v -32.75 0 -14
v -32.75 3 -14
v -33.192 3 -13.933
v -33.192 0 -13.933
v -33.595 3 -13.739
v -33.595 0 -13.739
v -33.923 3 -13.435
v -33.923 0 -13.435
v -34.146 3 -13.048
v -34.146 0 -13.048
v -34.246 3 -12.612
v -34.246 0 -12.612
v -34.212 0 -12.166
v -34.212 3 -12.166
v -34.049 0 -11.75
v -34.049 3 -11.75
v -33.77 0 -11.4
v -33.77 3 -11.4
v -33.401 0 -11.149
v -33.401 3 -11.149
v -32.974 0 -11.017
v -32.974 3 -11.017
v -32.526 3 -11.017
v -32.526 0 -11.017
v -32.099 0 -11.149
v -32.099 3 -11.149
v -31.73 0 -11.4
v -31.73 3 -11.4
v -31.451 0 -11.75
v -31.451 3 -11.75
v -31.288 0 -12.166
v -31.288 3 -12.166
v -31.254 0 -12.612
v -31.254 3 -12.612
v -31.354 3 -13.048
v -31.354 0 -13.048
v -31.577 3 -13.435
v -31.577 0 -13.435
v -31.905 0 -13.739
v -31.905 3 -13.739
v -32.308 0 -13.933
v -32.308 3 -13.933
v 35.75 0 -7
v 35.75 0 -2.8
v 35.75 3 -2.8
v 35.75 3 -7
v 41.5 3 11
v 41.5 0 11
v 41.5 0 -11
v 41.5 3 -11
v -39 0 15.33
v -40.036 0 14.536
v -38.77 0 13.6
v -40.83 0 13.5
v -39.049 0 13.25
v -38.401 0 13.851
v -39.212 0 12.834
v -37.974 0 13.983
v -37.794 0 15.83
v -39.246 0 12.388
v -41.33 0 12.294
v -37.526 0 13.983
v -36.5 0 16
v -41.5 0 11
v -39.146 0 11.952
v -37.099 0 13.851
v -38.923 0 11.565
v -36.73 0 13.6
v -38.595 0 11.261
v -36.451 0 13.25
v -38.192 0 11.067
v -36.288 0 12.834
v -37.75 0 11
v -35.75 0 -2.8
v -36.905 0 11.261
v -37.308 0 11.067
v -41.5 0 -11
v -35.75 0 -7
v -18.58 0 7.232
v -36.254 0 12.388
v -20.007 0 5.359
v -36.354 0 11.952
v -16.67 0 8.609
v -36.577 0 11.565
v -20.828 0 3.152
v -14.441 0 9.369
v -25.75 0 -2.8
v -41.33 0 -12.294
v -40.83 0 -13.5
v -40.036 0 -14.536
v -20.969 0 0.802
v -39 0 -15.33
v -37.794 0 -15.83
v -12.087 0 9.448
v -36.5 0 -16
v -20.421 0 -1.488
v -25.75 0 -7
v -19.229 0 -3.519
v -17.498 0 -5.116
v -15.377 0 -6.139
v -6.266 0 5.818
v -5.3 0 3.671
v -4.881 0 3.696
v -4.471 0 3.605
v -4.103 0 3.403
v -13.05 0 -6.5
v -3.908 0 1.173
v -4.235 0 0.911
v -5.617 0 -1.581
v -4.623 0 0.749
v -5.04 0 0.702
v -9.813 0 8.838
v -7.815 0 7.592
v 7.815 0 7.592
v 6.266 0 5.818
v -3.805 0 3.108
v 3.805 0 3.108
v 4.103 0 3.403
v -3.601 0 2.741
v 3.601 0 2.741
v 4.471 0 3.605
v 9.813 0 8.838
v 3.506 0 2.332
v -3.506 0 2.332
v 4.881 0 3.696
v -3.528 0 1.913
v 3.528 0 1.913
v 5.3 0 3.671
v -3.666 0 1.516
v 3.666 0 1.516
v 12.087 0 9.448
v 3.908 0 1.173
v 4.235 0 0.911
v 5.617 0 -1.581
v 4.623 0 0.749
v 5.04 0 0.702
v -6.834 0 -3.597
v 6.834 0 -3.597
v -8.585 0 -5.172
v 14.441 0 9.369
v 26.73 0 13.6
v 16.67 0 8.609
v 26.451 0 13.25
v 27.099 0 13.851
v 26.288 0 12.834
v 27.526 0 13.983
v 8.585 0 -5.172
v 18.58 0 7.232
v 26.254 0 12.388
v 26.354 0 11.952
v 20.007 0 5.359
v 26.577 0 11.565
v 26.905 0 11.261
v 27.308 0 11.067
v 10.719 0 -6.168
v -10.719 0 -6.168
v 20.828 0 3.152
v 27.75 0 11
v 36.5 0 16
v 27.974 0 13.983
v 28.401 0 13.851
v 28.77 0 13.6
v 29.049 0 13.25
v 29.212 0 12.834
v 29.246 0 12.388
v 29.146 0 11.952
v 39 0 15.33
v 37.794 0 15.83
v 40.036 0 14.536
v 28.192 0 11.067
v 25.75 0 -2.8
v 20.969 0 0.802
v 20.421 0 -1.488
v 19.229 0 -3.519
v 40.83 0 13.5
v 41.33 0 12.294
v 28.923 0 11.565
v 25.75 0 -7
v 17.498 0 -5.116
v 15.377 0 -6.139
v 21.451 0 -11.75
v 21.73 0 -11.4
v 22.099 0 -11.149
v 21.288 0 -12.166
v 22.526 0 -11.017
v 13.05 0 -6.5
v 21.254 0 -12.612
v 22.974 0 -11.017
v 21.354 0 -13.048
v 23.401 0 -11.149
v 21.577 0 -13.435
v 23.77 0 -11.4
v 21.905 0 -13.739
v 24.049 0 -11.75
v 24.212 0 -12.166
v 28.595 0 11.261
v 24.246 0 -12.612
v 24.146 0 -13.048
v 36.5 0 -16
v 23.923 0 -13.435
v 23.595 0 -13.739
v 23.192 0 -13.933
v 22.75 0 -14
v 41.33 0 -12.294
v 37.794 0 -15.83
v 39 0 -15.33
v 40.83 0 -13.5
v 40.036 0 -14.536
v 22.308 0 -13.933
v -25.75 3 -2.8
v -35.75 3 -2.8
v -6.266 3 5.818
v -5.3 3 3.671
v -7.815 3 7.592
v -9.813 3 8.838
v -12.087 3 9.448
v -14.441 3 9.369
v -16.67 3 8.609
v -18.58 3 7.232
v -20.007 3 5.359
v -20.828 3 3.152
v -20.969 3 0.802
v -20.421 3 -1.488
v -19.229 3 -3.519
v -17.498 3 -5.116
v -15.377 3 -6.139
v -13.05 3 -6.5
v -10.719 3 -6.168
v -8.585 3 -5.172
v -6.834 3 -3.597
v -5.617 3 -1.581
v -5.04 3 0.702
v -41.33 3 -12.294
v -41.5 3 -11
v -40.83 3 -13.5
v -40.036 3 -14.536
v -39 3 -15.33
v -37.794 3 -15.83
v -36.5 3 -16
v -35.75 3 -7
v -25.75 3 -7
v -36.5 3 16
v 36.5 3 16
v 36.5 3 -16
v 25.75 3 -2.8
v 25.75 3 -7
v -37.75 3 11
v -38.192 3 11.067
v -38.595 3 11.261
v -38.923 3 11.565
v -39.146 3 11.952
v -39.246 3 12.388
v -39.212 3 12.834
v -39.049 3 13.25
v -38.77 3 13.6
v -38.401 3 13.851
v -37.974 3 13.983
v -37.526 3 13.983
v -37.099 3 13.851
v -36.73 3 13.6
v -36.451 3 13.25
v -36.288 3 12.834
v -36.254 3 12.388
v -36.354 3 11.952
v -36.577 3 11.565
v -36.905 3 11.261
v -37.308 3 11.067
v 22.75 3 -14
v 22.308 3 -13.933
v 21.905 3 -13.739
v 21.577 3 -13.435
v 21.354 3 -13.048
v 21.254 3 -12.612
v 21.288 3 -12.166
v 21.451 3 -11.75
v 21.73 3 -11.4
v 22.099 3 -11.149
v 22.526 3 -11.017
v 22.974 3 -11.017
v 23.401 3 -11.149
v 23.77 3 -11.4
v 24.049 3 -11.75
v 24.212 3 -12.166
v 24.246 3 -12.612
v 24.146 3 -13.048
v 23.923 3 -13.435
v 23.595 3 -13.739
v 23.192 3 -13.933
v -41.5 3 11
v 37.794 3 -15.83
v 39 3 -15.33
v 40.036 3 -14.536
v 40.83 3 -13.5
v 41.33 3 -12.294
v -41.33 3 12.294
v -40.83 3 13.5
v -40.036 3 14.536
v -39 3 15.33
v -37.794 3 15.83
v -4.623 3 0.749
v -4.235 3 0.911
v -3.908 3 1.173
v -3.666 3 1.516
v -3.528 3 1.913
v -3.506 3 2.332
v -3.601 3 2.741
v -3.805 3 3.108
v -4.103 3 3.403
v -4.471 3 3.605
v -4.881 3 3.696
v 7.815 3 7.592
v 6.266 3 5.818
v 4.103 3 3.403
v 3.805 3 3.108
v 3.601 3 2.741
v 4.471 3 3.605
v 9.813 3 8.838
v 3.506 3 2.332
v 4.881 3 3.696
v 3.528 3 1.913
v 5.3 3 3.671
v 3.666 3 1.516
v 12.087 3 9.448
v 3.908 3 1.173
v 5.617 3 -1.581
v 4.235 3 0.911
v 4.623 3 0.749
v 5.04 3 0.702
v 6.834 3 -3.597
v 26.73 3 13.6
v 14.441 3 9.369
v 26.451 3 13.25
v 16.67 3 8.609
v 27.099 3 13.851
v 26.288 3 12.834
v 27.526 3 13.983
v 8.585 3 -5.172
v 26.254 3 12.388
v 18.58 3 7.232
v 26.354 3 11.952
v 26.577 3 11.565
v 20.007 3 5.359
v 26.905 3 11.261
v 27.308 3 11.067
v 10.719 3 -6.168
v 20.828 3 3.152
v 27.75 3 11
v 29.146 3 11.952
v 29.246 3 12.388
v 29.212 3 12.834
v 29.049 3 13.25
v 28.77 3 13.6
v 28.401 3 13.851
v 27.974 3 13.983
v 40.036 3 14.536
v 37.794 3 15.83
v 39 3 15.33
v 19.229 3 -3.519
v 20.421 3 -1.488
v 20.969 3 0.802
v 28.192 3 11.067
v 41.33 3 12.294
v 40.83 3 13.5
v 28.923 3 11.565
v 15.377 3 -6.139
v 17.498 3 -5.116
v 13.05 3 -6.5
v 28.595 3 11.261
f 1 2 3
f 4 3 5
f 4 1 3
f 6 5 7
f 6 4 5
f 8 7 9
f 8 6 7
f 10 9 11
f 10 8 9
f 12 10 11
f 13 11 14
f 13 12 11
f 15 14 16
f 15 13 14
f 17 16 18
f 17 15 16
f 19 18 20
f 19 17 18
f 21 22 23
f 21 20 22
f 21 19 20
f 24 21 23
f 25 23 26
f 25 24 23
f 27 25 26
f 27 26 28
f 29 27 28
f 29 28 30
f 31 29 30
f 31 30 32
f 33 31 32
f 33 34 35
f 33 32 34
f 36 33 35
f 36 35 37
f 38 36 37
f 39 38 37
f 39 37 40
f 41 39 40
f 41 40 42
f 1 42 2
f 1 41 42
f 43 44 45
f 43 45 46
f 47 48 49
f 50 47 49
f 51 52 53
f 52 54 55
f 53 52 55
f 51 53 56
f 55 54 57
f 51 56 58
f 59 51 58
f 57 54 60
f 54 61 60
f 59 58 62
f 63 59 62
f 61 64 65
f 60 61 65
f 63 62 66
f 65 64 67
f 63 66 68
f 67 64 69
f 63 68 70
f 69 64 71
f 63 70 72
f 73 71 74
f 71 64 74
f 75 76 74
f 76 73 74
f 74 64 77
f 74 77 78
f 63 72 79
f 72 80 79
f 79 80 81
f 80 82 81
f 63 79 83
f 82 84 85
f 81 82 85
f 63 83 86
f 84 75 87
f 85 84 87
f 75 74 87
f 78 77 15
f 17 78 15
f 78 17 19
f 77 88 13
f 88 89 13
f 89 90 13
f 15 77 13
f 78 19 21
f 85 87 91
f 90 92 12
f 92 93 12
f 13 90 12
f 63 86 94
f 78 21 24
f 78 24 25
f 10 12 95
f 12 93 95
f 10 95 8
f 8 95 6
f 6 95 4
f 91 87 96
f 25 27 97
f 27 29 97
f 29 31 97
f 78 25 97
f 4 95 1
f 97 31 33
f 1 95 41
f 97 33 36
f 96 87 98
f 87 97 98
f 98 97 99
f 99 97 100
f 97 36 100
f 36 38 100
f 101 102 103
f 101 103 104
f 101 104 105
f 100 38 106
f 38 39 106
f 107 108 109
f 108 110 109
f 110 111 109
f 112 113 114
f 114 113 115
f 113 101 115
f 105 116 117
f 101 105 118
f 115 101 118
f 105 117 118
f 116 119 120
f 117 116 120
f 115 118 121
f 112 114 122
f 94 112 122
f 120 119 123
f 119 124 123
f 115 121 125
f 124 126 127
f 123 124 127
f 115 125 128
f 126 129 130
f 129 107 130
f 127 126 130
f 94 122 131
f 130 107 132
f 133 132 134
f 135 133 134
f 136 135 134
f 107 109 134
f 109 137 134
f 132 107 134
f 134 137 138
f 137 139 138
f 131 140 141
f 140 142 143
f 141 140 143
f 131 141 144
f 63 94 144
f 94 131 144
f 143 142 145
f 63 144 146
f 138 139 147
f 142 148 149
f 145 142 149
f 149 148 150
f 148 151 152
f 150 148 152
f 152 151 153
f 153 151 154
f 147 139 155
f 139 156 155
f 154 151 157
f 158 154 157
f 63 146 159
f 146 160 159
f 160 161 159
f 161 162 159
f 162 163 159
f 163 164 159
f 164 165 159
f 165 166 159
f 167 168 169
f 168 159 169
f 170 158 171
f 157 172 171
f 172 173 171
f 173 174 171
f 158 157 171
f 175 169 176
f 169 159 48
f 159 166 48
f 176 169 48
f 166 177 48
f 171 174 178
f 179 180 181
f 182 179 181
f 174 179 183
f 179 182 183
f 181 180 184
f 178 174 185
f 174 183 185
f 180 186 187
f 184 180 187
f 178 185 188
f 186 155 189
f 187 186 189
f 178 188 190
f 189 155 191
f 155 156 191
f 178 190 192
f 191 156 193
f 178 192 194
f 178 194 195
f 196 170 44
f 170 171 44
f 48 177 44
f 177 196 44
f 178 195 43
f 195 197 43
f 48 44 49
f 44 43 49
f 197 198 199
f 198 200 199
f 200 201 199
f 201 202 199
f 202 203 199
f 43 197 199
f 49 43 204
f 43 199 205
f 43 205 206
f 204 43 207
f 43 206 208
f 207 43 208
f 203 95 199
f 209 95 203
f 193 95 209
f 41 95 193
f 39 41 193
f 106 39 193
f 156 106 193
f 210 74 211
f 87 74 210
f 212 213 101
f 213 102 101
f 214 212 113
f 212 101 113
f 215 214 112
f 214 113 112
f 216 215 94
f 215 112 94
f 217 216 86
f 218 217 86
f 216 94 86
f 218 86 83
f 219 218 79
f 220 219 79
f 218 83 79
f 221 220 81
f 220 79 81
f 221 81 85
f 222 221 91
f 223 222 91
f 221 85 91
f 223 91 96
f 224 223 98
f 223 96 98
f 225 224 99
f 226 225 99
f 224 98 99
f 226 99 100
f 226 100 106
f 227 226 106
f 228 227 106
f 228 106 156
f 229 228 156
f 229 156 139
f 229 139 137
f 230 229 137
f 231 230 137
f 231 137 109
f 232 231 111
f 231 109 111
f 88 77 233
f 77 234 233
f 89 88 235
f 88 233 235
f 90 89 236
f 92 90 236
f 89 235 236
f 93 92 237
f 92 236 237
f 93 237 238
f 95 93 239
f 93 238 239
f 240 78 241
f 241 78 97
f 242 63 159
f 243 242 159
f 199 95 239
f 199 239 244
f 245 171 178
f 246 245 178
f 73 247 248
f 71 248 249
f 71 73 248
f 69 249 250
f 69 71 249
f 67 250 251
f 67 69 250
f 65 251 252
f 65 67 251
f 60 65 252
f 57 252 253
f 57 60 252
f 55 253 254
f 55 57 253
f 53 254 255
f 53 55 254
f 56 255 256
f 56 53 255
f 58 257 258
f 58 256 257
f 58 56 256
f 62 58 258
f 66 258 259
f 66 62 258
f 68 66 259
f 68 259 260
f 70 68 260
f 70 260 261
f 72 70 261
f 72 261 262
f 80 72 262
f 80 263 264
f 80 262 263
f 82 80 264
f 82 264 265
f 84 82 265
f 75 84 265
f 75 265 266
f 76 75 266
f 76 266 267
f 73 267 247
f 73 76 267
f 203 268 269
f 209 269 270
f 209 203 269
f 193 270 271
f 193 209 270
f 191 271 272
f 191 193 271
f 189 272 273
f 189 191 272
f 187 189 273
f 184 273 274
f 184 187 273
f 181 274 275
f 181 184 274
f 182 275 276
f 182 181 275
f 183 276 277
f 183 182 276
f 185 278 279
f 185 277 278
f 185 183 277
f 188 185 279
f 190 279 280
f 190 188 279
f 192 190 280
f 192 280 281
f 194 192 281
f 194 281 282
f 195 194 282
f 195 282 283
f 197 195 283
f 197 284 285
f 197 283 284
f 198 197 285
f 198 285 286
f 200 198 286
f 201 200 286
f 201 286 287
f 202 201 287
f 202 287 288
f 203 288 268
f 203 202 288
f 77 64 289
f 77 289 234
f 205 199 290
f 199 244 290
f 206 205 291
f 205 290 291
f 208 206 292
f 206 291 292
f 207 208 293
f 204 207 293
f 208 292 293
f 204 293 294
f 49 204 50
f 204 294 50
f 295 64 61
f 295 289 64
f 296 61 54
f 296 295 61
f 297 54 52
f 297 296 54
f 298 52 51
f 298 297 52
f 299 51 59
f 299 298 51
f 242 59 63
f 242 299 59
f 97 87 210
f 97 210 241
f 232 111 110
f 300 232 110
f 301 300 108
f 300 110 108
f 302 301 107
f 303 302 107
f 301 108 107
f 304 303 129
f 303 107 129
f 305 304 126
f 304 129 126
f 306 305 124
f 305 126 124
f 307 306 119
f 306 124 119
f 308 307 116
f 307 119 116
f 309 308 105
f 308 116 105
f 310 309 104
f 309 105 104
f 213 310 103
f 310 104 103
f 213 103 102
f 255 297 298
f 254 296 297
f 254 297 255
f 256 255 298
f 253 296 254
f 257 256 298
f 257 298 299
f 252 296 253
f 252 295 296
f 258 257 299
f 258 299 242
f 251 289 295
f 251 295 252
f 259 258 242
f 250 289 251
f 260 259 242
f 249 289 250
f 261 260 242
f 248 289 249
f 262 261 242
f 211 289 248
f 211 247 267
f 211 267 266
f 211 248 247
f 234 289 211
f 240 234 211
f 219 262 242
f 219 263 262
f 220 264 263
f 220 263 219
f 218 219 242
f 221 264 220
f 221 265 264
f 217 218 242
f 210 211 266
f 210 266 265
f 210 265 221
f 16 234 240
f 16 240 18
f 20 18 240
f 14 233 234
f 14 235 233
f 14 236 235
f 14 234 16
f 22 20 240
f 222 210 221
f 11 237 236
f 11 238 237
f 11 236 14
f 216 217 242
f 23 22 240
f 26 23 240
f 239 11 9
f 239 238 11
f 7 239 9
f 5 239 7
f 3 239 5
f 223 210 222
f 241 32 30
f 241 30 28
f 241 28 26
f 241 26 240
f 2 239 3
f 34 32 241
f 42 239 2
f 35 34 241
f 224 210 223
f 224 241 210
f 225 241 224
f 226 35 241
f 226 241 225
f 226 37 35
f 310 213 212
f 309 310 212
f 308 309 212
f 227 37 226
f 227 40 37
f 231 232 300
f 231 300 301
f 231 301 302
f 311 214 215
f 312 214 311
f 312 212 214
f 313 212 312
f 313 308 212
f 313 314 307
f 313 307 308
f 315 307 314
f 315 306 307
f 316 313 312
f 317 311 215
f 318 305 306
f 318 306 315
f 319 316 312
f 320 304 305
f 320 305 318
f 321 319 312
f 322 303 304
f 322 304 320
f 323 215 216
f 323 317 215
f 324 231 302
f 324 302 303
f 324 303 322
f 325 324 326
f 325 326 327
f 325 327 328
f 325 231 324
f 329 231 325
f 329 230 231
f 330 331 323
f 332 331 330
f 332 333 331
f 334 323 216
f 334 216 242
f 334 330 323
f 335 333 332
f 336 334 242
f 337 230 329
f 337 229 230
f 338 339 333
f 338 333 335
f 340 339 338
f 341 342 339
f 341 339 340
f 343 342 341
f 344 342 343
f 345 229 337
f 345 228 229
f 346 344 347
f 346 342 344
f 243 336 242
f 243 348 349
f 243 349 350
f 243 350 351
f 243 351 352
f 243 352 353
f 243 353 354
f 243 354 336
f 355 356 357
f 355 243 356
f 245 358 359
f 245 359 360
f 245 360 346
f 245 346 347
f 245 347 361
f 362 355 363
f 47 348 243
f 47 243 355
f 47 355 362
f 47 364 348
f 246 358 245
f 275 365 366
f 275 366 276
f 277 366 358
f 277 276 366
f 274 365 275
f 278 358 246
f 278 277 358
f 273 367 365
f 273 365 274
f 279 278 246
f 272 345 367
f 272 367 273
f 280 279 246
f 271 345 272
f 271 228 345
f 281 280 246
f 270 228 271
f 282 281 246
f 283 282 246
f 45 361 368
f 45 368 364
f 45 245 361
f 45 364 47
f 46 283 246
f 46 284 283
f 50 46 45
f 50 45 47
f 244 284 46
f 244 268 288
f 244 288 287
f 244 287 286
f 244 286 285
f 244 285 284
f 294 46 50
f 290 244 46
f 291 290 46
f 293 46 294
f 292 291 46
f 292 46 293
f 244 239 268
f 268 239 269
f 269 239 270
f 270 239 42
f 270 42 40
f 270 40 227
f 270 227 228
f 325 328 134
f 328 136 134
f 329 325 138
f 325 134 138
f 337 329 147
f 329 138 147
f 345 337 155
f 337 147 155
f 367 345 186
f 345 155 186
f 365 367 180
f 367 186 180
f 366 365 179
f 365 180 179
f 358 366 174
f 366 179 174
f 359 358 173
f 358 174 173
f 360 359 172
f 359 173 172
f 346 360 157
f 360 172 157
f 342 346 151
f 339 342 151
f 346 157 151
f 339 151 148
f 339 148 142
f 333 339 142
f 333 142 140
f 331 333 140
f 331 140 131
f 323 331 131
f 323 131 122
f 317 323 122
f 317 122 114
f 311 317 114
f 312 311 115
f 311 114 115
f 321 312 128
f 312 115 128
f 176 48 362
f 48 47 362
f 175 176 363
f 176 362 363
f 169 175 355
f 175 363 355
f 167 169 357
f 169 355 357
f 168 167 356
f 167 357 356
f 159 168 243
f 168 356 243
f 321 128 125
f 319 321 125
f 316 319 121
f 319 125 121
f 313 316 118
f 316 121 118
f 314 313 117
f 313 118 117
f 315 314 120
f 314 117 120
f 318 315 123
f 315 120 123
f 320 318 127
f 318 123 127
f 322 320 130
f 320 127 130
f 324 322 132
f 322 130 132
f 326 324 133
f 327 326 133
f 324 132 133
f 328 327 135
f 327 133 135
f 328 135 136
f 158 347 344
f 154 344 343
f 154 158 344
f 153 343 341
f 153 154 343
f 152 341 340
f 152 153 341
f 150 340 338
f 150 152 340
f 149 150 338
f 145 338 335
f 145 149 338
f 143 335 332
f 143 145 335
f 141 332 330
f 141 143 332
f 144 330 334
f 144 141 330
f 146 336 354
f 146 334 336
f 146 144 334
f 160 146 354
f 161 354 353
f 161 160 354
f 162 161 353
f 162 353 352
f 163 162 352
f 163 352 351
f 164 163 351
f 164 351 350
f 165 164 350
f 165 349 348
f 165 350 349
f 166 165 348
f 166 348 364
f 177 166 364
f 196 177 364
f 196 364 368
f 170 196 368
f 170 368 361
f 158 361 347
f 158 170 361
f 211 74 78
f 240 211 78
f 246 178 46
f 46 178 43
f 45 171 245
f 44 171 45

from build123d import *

# Parameters (mm, degrees)
SKETCH1_W           = 95
SKETCH1_H           = 35
BOSS_EXTRUDE1_DEPTH = 3
CUT_EXTRUDE1_REACH  = 52.71
SKETCH3_R           = 8
CUT_EXTRUDE2_REACH  = 52.71
SKETCH4_R           = 1.5
SKETCH5_W           = 95
SKETCH5_H           = 4
BOSS_EXTRUDE2_DEPTH = 3
CUT_EXTRUDE3_REACH  = 54.225
SKETCH6_W           = 10
SKETCH6_H           = 4.2
CUT_EXTRUDE4_REACH  = 54.225
SKETCH7_R           = 1.5
CUT_EXTRUDE5_REACH  = 54.225
SKETCH8_W           = 105.539235452
SKETCH8_H           = 51.644684014
SKETCH8_W_2         = 83
SKETCH8_H_2         = 32
FILLET1_R           = 5


with BuildPart() as part:
    # Sketch1 → Boss-Extrude1 (new body)
    with BuildSketch(Plane(origin=(0, 0, 0), x_dir=(1, 0, 0), z_dir=(0, 1, 0))):
        Rectangle(SKETCH1_W, SKETCH1_H)
    extrude(amount=BOSS_EXTRUDE1_DEPTH)

    # Sketch3 → Cut-Extrude1 (cut, up to next)
    with BuildSketch(Plane.XZ, mode=Mode.PRIVATE) as cut_extrude1_sk1:
        with Locations(Location((-13, 1.5, 0), (0, 0, 270))):
            Circle(SKETCH3_R)
    cut_extrude1_tool1 = extrude(cut_extrude1_sk1.sketch, amount=-CUT_EXTRUDE1_REACH, mode=Mode.PRIVATE) & part.part
    # Sketch3 → Cut-Extrude1 (cut, up to next)
    with BuildSketch(Plane.XZ, mode=Mode.PRIVATE) as cut_extrude1_sk2:
        with Locations(Location((13, 1.5, 0), (0, 0, 270))):
            Circle(SKETCH3_R)
    cut_extrude1_tool2 = extrude(cut_extrude1_sk2.sketch, amount=-CUT_EXTRUDE1_REACH, mode=Mode.PRIVATE) & part.part
    add(cut_extrude1_tool1.solids().sort_by_distance((-13, 0, 1.5))[0], mode=Mode.SUBTRACT)
    add(cut_extrude1_tool2.solids().sort_by_distance((13, 0, 1.5))[0], mode=Mode.SUBTRACT)

    # Sketch4 → Cut-Extrude2 (cut, up to next)
    with BuildSketch(Plane(origin=(0, 0, 0), x_dir=(1, 0, 0), z_dir=(0, 1, 0)), mode=Mode.PRIVATE) as cut_extrude2_sk1:
        with Locations(Location((-37.75, -12.5, 0), (0, 0, 90))):
            Circle(SKETCH4_R)
    cut_extrude2_tool1 = extrude(cut_extrude2_sk1.sketch, amount=CUT_EXTRUDE2_REACH, mode=Mode.PRIVATE) & part.part
    # Sketch4 → Cut-Extrude2 (cut, up to next)
    with BuildSketch(Plane(origin=(0, 0, 0), x_dir=(1, 0, 0), z_dir=(0, 1, 0)), mode=Mode.PRIVATE) as cut_extrude2_sk2:
        with Locations(Location((27.75, -12.5, 0), (0, 0, 90))):
            Circle(SKETCH4_R)
    cut_extrude2_tool2 = extrude(cut_extrude2_sk2.sketch, amount=CUT_EXTRUDE2_REACH, mode=Mode.PRIVATE) & part.part
    # Sketch4 → Cut-Extrude2 (cut, up to next)
    with BuildSketch(Plane(origin=(0, 0, 0), x_dir=(1, 0, 0), z_dir=(0, 1, 0)), mode=Mode.PRIVATE) as cut_extrude2_sk3:
        with Locations(Location((22.75, 12.5, 0), (0, 0, 90))):
            Circle(SKETCH4_R)
    cut_extrude2_tool3 = extrude(cut_extrude2_sk3.sketch, amount=CUT_EXTRUDE2_REACH, mode=Mode.PRIVATE) & part.part
    # Sketch4 → Cut-Extrude2 (cut, up to next)
    with BuildSketch(Plane(origin=(0, 0, 0), x_dir=(1, 0, 0), z_dir=(0, 1, 0)), mode=Mode.PRIVATE) as cut_extrude2_sk4:
        with Locations(Location((-32.75, 12.5, 0), (0, 0, 90))):
            Circle(SKETCH4_R)
    cut_extrude2_tool4 = extrude(cut_extrude2_sk4.sketch, amount=CUT_EXTRUDE2_REACH, mode=Mode.PRIVATE) & part.part
    add(cut_extrude2_tool1.solids().sort_by_distance((-37.75, 0, 12.5))[0], mode=Mode.SUBTRACT)
    add(cut_extrude2_tool2.solids().sort_by_distance((27.75, 0, 12.5))[0], mode=Mode.SUBTRACT)
    add(cut_extrude2_tool3.solids().sort_by_distance((22.75, 0, -12.5))[0], mode=Mode.SUBTRACT)
    add(cut_extrude2_tool4.solids().sort_by_distance((-32.75, 0, -12.5))[0], mode=Mode.SUBTRACT)

    # Sketch5 → Boss-Extrude2 (add)
    with BuildSketch(Plane(origin=(0, 0, 0), x_dir=(1, 0, 0), z_dir=(0, 1, 0))):
        with Locations((0, -19.5)):
            Rectangle(SKETCH5_W, SKETCH5_H)
        with Locations((0, 19.5)):
            Rectangle(SKETCH5_W, SKETCH5_H)
    extrude(amount=BOSS_EXTRUDE2_DEPTH)

    # Sketch6 → Cut-Extrude3 (cut, up to next)
    with BuildSketch(Plane(origin=(0, 0, 0), x_dir=(1, 0, 0), z_dir=(0, 1, 0)), mode=Mode.PRIVATE) as cut_extrude3_sk1:
        with Locations((-30.75, 4.9)):
            Rectangle(SKETCH6_W, SKETCH6_H)
    cut_extrude3_tool1 = extrude(cut_extrude3_sk1.sketch, amount=CUT_EXTRUDE3_REACH, mode=Mode.PRIVATE) & part.part
    # Sketch6 → Cut-Extrude3 (cut, up to next)
    with BuildSketch(Plane(origin=(0, 0, 0), x_dir=(1, 0, 0), z_dir=(0, 1, 0)), mode=Mode.PRIVATE) as cut_extrude3_sk2:
        with Locations((30.75, 4.9)):
            Rectangle(SKETCH6_W, SKETCH6_H)
    cut_extrude3_tool2 = extrude(cut_extrude3_sk2.sketch, amount=CUT_EXTRUDE3_REACH, mode=Mode.PRIVATE) & part.part
    add(cut_extrude3_tool1.solids().sort_by_distance((-30.75, 0, -4.9))[0], mode=Mode.SUBTRACT)
    add(cut_extrude3_tool2.solids().sort_by_distance((30.75, 0, -4.9))[0], mode=Mode.SUBTRACT)

    # Sketch7 → Cut-Extrude4 (cut, up to next)
    with BuildSketch(Plane.XZ, mode=Mode.PRIVATE) as cut_extrude4_sk1:
        with Locations((-5, 2.201101087)):
            Circle(SKETCH7_R)
    cut_extrude4_tool1 = extrude(cut_extrude4_sk1.sketch, amount=-CUT_EXTRUDE4_REACH, mode=Mode.PRIVATE) & part.part
    # Sketch7 → Cut-Extrude4 (cut, up to next)
    with BuildSketch(Plane.XZ, mode=Mode.PRIVATE) as cut_extrude4_sk2:
        with Locations((5, 2.201101087)):
            Circle(SKETCH7_R)
    cut_extrude4_tool2 = extrude(cut_extrude4_sk2.sketch, amount=-CUT_EXTRUDE4_REACH, mode=Mode.PRIVATE) & part.part
    add(cut_extrude4_tool1.solids().sort_by_distance((-5, 0, 2.201101))[0], mode=Mode.SUBTRACT)
    add(cut_extrude4_tool2.solids().sort_by_distance((5, 0, 2.201101))[0], mode=Mode.SUBTRACT)

    # Sketch8 → Cut-Extrude5 (cut, up to next)
    with BuildSketch(Plane(origin=(0, 0, 0), x_dir=(1, 0, 0), z_dir=(0, 1, 0)), mode=Mode.PRIVATE) as cut_extrude5_sk1:
        Rectangle(SKETCH8_W, SKETCH8_H)
        Rectangle(SKETCH8_W_2, SKETCH8_H_2, mode=Mode.SUBTRACT)
    cut_extrude5_tool1 = extrude(cut_extrude5_sk1.sketch, amount=CUT_EXTRUDE5_REACH, mode=Mode.PRIVATE) & part.part
    add(cut_extrude5_tool1.solids().sort_by_distance((0, 0, -24.647365))[0], mode=Mode.SUBTRACT)

    # Fillet1
    fillet1_edges = [part.edges().sort_by_distance(p)[0] for p in [
        (41.5, 1.5, -16),
        (-41.5, 1.5, -16),
        (-41.5, 1.5, 16),
        (41.5, 1.5, 16),
    ]]
    fillet(fillet1_edges, radius=FILLET1_R)


solid = part.part
